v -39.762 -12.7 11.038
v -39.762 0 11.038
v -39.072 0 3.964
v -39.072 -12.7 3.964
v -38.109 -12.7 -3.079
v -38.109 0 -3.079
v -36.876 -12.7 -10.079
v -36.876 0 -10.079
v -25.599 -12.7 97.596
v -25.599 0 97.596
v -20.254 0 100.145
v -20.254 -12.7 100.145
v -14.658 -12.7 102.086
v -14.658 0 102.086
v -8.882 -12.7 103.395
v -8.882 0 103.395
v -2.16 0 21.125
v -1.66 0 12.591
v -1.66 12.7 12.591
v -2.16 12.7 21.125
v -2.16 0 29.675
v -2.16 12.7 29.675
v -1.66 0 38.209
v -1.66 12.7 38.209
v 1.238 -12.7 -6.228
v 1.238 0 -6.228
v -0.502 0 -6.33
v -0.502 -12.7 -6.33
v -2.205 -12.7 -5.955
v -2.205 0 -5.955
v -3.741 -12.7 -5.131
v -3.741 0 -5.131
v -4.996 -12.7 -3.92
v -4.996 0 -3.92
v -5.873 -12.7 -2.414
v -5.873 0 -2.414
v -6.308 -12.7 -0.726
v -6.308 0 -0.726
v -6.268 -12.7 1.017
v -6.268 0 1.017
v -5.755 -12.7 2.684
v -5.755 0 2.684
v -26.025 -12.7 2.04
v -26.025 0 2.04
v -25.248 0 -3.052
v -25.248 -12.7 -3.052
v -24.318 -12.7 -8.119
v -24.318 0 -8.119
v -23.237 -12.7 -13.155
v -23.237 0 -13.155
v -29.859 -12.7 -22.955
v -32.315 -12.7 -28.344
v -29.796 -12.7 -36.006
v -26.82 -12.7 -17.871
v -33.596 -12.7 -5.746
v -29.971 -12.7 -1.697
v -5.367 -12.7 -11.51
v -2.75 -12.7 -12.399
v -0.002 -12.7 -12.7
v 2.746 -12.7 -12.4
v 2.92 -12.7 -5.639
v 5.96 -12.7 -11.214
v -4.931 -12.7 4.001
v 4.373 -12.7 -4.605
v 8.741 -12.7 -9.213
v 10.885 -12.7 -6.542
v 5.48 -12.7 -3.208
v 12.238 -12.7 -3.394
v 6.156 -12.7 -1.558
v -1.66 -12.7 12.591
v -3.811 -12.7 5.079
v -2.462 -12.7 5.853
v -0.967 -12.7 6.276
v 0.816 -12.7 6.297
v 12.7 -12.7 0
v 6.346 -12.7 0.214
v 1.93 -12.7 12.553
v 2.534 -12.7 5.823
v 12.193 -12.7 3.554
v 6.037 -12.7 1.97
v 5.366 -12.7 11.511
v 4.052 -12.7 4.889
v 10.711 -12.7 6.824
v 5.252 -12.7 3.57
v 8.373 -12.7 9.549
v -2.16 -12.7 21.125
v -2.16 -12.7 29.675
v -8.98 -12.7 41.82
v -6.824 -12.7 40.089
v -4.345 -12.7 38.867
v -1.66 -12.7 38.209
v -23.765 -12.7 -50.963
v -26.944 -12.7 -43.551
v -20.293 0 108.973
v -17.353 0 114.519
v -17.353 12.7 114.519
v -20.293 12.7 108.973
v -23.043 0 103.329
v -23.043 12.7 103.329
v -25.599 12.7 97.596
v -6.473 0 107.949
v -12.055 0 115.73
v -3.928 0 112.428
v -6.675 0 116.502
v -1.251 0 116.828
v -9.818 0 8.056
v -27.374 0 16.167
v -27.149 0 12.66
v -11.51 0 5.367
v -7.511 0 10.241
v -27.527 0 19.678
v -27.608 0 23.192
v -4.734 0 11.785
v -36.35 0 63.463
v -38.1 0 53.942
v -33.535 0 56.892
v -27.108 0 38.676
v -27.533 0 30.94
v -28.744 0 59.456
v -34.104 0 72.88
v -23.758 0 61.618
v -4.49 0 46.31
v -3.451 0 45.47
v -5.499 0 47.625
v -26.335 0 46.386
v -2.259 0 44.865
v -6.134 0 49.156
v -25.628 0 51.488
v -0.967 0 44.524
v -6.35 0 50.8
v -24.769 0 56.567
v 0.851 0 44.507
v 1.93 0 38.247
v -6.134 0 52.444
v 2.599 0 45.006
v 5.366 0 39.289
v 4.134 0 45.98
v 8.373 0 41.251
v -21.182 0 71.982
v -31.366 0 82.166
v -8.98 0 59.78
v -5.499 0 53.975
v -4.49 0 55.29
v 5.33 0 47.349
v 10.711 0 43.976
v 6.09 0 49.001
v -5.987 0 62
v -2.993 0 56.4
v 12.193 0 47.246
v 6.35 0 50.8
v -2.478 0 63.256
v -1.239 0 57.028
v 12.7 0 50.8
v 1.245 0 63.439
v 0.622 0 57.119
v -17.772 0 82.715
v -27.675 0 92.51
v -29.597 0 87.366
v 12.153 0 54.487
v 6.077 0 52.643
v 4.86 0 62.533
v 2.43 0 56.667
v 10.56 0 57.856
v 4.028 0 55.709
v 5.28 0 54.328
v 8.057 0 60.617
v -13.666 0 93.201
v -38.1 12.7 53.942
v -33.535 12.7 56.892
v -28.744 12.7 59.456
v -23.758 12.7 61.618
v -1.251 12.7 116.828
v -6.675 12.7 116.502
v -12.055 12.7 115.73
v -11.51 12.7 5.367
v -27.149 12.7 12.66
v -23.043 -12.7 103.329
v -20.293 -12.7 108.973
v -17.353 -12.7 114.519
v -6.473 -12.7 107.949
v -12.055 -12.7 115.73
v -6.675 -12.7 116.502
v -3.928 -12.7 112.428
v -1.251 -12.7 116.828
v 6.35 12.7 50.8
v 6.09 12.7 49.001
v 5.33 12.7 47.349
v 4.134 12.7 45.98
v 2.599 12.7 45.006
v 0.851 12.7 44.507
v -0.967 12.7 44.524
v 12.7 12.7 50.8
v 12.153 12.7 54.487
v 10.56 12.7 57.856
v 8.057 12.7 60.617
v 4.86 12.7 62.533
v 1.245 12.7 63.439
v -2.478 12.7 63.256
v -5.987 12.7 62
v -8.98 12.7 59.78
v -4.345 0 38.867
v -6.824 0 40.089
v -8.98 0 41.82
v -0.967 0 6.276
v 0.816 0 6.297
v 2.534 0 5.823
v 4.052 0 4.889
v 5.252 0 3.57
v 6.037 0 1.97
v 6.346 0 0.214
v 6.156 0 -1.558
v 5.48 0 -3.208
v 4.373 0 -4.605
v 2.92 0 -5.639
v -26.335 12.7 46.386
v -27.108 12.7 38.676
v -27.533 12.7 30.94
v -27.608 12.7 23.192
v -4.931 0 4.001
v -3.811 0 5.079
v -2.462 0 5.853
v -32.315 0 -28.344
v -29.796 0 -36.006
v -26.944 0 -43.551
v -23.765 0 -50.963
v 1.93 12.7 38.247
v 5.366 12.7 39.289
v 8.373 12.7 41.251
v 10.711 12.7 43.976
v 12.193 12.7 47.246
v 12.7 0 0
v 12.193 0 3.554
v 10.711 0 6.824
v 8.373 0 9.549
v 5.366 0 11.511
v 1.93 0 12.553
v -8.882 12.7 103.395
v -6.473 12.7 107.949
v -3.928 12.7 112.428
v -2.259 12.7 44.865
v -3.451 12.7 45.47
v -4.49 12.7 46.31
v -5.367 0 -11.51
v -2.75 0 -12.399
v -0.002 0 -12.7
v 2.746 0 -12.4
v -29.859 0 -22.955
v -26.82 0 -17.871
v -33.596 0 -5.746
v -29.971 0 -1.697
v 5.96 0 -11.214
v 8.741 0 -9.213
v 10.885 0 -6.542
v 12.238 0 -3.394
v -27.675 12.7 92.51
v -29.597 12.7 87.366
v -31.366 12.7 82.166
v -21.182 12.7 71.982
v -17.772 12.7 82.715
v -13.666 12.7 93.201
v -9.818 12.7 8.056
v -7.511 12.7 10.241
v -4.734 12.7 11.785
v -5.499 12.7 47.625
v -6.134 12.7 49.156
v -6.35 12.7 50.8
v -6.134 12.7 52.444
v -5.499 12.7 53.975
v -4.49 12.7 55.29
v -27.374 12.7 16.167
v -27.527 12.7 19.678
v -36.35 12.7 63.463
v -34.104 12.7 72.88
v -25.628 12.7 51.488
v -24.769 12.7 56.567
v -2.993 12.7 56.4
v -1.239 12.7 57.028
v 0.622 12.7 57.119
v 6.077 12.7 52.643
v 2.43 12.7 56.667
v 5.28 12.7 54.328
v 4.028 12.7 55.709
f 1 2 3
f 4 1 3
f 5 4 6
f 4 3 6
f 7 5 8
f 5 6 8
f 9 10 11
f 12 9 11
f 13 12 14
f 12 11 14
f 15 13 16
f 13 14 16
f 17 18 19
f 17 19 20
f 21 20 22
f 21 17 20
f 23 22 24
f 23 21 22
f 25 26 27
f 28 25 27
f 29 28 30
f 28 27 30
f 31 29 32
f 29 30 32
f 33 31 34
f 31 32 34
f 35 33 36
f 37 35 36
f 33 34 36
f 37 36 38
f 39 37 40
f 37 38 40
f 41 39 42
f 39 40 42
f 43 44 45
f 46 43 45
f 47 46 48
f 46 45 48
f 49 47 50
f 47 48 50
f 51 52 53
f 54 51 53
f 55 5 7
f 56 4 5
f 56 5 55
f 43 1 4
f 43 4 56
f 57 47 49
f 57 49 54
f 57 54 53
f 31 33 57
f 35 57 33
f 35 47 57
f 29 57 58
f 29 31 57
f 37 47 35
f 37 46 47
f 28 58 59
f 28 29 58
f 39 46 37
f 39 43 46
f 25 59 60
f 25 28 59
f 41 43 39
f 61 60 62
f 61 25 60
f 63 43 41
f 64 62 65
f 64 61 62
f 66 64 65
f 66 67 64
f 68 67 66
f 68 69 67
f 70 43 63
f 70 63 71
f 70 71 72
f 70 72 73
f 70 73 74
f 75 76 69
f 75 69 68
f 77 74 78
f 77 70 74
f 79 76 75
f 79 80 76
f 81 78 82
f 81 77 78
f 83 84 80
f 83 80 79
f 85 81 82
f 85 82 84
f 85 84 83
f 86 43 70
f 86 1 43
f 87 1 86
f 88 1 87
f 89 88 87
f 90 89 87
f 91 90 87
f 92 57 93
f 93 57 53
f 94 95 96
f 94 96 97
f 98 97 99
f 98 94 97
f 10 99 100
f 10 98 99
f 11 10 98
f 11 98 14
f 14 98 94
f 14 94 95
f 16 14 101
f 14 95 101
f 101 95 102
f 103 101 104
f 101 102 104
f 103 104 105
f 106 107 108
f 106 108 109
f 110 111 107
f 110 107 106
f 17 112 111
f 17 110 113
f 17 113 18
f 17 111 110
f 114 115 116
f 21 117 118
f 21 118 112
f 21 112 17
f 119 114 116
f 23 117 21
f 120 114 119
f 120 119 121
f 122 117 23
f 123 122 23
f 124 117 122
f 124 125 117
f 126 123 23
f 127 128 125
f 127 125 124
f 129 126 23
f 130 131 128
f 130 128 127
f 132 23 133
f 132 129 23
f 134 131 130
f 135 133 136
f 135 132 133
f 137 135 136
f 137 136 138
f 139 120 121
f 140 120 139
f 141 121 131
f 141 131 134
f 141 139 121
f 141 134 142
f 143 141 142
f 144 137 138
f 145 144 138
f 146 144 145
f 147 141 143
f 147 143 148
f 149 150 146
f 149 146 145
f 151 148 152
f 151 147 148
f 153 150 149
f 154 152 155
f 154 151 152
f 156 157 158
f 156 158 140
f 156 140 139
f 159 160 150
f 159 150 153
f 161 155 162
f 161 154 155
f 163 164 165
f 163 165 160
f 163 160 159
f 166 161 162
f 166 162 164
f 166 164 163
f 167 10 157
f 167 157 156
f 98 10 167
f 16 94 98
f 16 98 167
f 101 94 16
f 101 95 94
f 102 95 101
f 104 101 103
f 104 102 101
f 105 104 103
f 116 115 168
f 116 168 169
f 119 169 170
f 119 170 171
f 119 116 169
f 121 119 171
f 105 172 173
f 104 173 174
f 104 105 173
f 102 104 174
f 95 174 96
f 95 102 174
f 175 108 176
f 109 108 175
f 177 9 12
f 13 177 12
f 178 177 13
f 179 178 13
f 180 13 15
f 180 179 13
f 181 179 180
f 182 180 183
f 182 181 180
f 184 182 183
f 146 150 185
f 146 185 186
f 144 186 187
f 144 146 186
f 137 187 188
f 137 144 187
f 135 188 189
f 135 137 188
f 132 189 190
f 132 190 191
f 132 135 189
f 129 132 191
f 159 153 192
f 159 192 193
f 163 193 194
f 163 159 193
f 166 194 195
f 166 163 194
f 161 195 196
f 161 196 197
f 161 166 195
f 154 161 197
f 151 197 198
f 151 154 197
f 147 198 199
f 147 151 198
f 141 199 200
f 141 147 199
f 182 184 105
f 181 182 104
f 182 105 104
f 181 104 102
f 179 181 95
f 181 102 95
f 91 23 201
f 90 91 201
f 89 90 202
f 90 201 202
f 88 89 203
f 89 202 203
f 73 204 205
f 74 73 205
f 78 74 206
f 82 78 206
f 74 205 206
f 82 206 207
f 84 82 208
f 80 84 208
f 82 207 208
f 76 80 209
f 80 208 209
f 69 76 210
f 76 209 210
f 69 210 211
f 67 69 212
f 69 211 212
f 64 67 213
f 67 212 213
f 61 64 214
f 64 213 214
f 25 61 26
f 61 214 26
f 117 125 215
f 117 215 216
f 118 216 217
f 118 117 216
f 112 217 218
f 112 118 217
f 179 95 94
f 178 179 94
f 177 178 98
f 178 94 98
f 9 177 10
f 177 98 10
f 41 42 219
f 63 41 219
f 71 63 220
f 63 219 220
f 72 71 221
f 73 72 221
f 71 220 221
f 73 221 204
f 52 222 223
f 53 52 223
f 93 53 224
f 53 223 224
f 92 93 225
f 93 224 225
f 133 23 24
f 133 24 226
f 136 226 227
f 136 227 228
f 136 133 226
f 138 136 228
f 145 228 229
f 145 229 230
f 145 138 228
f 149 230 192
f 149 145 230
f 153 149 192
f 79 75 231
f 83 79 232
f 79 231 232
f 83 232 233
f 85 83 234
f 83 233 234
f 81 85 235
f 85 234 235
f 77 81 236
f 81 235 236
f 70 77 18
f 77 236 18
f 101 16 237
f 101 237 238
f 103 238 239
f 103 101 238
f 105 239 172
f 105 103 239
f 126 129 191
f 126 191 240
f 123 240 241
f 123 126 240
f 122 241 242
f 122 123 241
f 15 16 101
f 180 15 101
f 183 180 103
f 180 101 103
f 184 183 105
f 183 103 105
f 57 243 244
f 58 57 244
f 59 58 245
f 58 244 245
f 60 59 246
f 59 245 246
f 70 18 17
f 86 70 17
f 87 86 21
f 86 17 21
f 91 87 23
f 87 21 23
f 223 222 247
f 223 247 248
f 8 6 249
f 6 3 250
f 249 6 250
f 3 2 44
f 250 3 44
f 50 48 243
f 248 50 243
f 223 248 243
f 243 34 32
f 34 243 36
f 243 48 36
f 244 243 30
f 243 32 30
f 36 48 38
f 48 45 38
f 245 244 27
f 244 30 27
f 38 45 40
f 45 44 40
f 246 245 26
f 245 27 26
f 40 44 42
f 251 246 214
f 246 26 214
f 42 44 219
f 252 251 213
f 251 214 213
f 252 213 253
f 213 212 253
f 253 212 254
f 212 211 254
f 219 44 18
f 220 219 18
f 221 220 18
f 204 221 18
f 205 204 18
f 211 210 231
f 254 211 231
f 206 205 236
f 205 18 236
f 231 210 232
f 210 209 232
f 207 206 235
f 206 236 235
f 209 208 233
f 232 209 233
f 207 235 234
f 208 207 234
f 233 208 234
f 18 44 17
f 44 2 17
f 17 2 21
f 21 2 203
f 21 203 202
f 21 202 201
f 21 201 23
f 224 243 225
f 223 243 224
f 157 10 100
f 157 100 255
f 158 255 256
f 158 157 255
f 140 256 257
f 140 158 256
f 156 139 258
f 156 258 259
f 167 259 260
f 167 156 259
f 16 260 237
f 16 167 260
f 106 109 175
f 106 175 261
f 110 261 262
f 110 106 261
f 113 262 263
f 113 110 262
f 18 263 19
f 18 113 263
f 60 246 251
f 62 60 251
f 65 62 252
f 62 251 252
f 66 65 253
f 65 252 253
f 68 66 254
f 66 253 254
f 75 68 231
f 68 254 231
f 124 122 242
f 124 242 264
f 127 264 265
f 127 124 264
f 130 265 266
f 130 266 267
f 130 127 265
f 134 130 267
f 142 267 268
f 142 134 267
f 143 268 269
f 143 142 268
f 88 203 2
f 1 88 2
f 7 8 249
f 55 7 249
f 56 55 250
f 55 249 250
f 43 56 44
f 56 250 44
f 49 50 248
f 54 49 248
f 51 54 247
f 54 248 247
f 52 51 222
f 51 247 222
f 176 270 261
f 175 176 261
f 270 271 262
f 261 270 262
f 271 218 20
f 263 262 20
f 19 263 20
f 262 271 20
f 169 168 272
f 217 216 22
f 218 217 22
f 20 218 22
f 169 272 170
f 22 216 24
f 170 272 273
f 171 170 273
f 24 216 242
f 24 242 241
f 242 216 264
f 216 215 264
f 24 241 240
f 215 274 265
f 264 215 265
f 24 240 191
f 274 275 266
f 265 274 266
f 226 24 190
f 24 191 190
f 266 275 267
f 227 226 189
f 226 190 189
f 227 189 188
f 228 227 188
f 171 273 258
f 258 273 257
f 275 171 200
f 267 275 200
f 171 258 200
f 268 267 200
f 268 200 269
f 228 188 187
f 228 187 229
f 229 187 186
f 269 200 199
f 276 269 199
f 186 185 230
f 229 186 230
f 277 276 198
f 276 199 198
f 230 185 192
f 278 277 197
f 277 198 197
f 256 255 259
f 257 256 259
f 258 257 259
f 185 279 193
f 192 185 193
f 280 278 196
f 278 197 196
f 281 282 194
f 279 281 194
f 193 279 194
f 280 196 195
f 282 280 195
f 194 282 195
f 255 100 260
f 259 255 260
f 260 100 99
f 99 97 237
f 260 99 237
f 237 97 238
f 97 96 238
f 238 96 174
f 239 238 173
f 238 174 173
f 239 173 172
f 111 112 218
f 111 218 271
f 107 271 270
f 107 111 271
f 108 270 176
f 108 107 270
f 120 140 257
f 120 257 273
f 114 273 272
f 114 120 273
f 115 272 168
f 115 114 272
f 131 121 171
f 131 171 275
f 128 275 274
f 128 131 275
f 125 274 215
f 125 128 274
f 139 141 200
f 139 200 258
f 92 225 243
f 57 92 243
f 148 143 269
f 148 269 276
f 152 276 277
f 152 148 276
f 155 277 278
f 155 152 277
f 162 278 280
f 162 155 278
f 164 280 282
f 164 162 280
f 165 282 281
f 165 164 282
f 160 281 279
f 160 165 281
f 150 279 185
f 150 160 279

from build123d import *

# Parameters (mm, degrees)
F1_DEPTH = 12.7
F2_DEPTH = 12.7


with BuildPart() as f1:
    # F0 (on Front) → F1 (new body)
    with BuildSketch(Plane.XZ):
        with BuildLine():
            ThreePointArc((-25.5994319004, 97.5955626783), (-17.4827308479, 101.1935484174), (-8.8816627401, 103.3953578462))
            ThreePointArc((-8.8816627401, 103.3953578462), (-5.2173217074, 110.1976419206), (-1.2506190365, 116.8281572666))
            ThreePointArc((-1.2506190365, 116.8281572666), (-9.3730802173, 116.1714537642), (-17.3528252422, 114.5193930928))
            ThreePointArc((-17.3528252422, 114.5193930928), (-21.6922788774, 106.1628031287), (-25.5994319004, 97.5955626783))
        make_face()
    extrude(amount=F1_DEPTH)


with BuildPart() as f1b:
    # F0 (on Front) → F1, piece 2 (new body)
    with BuildSketch(Plane.XZ):
        with BuildLine():
            Line((-23.76464523, -50.9634461592), (-16.5005489408, -35.3855413958))
            ThreePointArc((-16.5005489408, -35.3855413958), (-20.2450862438, -24.3843475762), (-23.2367694573, -13.1550262867))
            ThreePointArc((-23.2367694573, -13.1550262867), (-28.4102740665, -20.3703701742), (-32.3152871513, -28.3439020242))
            ThreePointArc((-32.3152871513, -28.3439020242), (-28.4112043135, -39.7940095573), (-23.76464523, -50.9634461592))
        make_face()
        with BuildLine():
            ThreePointArc((-5.3672519241, -11.5101088954), (-11.934096284, -4.3436558202), (-11.5101088954, 5.3672519241))
            Line((-11.5101088954, 5.3672519241), (-27.1488132668, 12.6596995361))
            ThreePointArc((-27.1488132668, 12.6596995361), (-26.6697420202, 7.341230959), (-26.0254878639, 2.0402354064))
            ThreePointArc((-26.0254878639, 2.0402354064), (-24.8021452922, -5.5887813575), (-23.2367694573, -13.1550262867))
            ThreePointArc((-23.2367694573, -13.1550262867), (-20.2450862438, -24.3843475762), (-16.5005489408, -35.3855413958))
            Line((-16.5005489408, -35.3855413958), (-5.3672519241, -11.5101088954))
        make_face()
        with BuildLine():
            ThreePointArc((-26.0254878639, 2.0402354064), (-26.6697420202, 7.341230959), (-27.1488132668, 12.6596995361))
            Line((-27.1488132668, 12.6596995361), (-34.6448439504, 16.1551560496))
            Line((-34.6448439504, 16.1551560496), (-39.761986918, 11.038013082))
            ThreePointArc((-39.761986918, 11.038013082), (-38.6246011082, 0.4379371292), (-36.876448445, -10.078679197))
            ThreePointArc((-36.876448445, -10.078679197), (-31.8255332412, -3.6838460696), (-26.0254878639, 2.0402354064))
        make_face()
        with BuildLine():
            ThreePointArc((-11.5101088954, 5.3672519241), (-7.5106952878, 10.2410671462), (-1.6602958084, 12.5910054336))
            ThreePointArc((-1.6602958084, 12.5910054336), (-2.2222120536, 25.4), (-1.6602958084, 38.2089945664))
            ThreePointArc((-1.6602958084, 38.2089945664), (-5.6182483027, 39.4102991256), (-8.9802561211, 41.8197438789))
            Line((-8.9802561211, 41.8197438789), (-27.6080120185, 23.1919879815))
            ThreePointArc((-27.6080120185, 23.1919879815), (-27.459279183, 17.922318047), (-27.1488132668, 12.6596995361))
            Line((-27.1488132668, 12.6596995361), (-11.5101088954, 5.3672519241))
        make_face()
        with BuildLine():
            Line((-34.6448439504, 16.1551560496), (-27.1488132668, 12.6596995361))
            ThreePointArc((-27.1488132668, 12.6596995361), (-27.459279183, 17.922318047), (-27.6080120185, 23.1919879815))
            Line((-27.6080120185, 23.1919879815), (-34.6448439504, 16.1551560496))
        make_face()
        with BuildLine():
            Line((-5.7550544477, 2.6836259621), (-11.5101088954, 5.3672519241))
            ThreePointArc((-11.5101088954, 5.3672519241), (-11.934096284, -4.3436558202), (-5.3672519241, -11.5101088954))
            Line((-5.3672519241, -11.5101088954), (-2.6836259621, -5.7550544477))
            ThreePointArc((-2.6836259621, -5.7550544477), (-5.967048142, -2.1718279101), (-5.7550544477, 2.6836259621))
        make_face()
        with BuildLine():
            ThreePointArc((-0.9666668919, 6.2759903697), (-1.3477700165, 9.4297317015), (-1.6602958084, 12.5910054336))
            ThreePointArc((-1.6602958084, 12.5910054336), (-7.5106952878, 10.2410671462), (-11.5101088954, 5.3672519241))
            Line((-11.5101088954, 5.3672519241), (-5.7550544477, 2.6836259621))
            ThreePointArc((-5.7550544477, 2.6836259621), (-3.8107289265, 5.0794532234), (-0.9666668919, 6.2759903697))
        make_face()
        with BuildLine():
            ThreePointArc((2.7462097635, -12.3995295046), (9.9037079924, -7.9502558451), (12.7, 0))
            ThreePointArc((12.7, 0), (8.372700975, 9.5492344397), (-1.6602958084, 12.5910054336))
            ThreePointArc((-1.6602958084, 12.5910054336), (-1.3477700165, 9.4297317015), (-0.9666668919, 6.2759903697))
            ThreePointArc((-0.9666668919, 6.2759903697), (4.1342572027, 4.8197943298), (6.35, 0))
            ThreePointArc((6.35, 0), (4.9083970483, -4.0286645947), (1.2381453807, -6.2281213874))
            ThreePointArc((1.2381453807, -6.2281213874), (1.958668649, -9.3220137901), (2.7462097635, -12.3995295046))
        make_face()
        with BuildLine():
            ThreePointArc((-5.3672519241, -11.5101088954), (-1.3839193463, -12.6243719544), (2.7462097635, -12.3995295046))
            ThreePointArc((2.7462097635, -12.3995295046), (1.958668649, -9.3220137901), (1.2381453807, -6.2281213874))
            ThreePointArc((1.2381453807, -6.2281213874), (-0.7604614455, -6.3042999921), (-2.6836259621, -5.7550544477))
            Line((-2.6836259621, -5.7550544477), (-5.3672519241, -11.5101088954))
        make_face()
    extrude(amount=F1_DEPTH)


with BuildPart() as f2:
    # F0 (on Front) → F2 (new body)
    with BuildSketch(Plane.XZ):
        with BuildLine():
            Line((-27.6080120185, 23.1919879815), (-8.9802561211, 41.8197438789))
            ThreePointArc((-8.9802561211, 41.8197438789), (-12.7, 50.8), (-8.9802561211, 59.7802561211))
            Line((-8.9802561211, 59.7802561211), (-21.1816672401, 71.9816672401))
            ThreePointArc((-21.1816672401, 71.9816672401), (-22.5505109099, 66.8200895478), (-23.7581572919, 61.6184352454))
            ThreePointArc((-23.7581572919, 61.6184352454), (-25.2178687116, 54.0310966868), (-26.334704766, 46.3857620924))
            ThreePointArc((-26.334704766, 46.3857620924), (-27.3640962034, 34.8104358188), (-27.6080120185, 23.1919879815))
        make_face()
        with BuildLine():
            ThreePointArc((-11.5101088954, 5.3672519241), (-7.5106952878, 10.2410671462), (-1.6602958084, 12.5910054336))
            ThreePointArc((-1.6602958084, 12.5910054336), (-2.2222120536, 25.4), (-1.6602958084, 38.2089945664))
            ThreePointArc((-1.6602958084, 38.2089945664), (-5.6182483027, 39.4102991256), (-8.9802561211, 41.8197438789))
            Line((-8.9802561211, 41.8197438789), (-27.6080120185, 23.1919879815))
            ThreePointArc((-27.6080120185, 23.1919879815), (-27.459279183, 17.922318047), (-27.1488132668, 12.6596995361))
            Line((-27.1488132668, 12.6596995361), (-11.5101088954, 5.3672519241))
        make_face()
        with BuildLine():
            ThreePointArc((-23.7581572919, 61.6184352454), (-22.5505109099, 66.8200895478), (-21.1816672401, 71.9816672401))
            Line((-21.1816672401, 71.9816672401), (-31.3659370421, 82.1659370421))
            ThreePointArc((-31.3659370421, 82.1659370421), (-35.2888897153, 68.1864561816), (-38.0996377881, 53.9416277138))
            ThreePointArc((-38.0996377881, 53.9416277138), (-31.1661683001, 58.2232904729), (-23.7581572919, 61.6184352454))
        make_face()
        with BuildLine():
            Line((-31.3659370421, 82.1659370421), (-21.1816672401, 71.9816672401))
            ThreePointArc((-21.1816672401, 71.9816672401), (-15.8051852828, 87.9913837722), (-8.8816627401, 103.3953578462))
            ThreePointArc((-8.8816627401, 103.3953578462), (-17.4827308479, 101.1935484174), (-25.5994319004, 97.5955626783))
            ThreePointArc((-25.5994319004, 97.5955626783), (-28.6550820191, 89.9451798969), (-31.3659370421, 82.1659370421))
        make_face()
        with BuildLine():
            ThreePointArc((-25.5994319004, 97.5955626783), (-17.4827308479, 101.1935484174), (-8.8816627401, 103.3953578462))
            ThreePointArc((-8.8816627401, 103.3953578462), (-5.2173217074, 110.1976419206), (-1.2506190365, 116.8281572666))
            ThreePointArc((-1.2506190365, 116.8281572666), (-9.3730802173, 116.1714537642), (-17.3528252422, 114.5193930928))
            ThreePointArc((-17.3528252422, 114.5193930928), (-21.6922788774, 106.1628031287), (-25.5994319004, 97.5955626783))
        make_face()
        with BuildLine():
            ThreePointArc((-8.9802561211, 41.8197438789), (-5.6182483027, 39.4102991256), (-1.6602958084, 38.2089945664))
            ThreePointArc((-1.6602958084, 38.2089945664), (-1.3477700165, 41.3702682985), (-0.9666668919, 44.5240096303))
            ThreePointArc((-0.9666668919, 44.5240096303), (-2.8707975956, 45.1359889508), (-4.4901280605, 46.3098719395))
            Line((-4.4901280605, 46.3098719395), (-8.9802561211, 41.8197438789))
        make_face()
        with BuildLine():
            ThreePointArc((-8.9802561211, 59.7802561211), (-12.7, 50.8), (-8.9802561211, 41.8197438789))
            Line((-8.9802561211, 41.8197438789), (-4.4901280605, 46.3098719395))
            ThreePointArc((-4.4901280605, 46.3098719395), (-6.35, 50.8), (-4.4901280605, 55.2901280605))
            Line((-4.4901280605, 55.2901280605), (-8.9802561211, 59.7802561211))
        make_face()
        with BuildLine():
            ThreePointArc((-0.9666668919, 44.5240096303), (-1.3477700165, 41.3702682985), (-1.6602958084, 38.2089945664))
            ThreePointArc((-1.6602958084, 38.2089945664), (8.372700975, 41.2507655603), (12.7, 50.8))
            ThreePointArc((12.7, 50.8), (4.860079591, 62.5332700629), (-8.9802561211, 59.7802561211))
            Line((-8.9802561211, 59.7802561211), (-4.4901280605, 55.2901280605))
            ThreePointArc((-4.4901280605, 55.2901280605), (2.4300397955, 56.6666350314), (6.35, 50.8))
            ThreePointArc((6.35, 50.8), (4.1342572027, 45.9802056702), (-0.9666668919, 44.5240096303))
        make_face()
    extrude(amount=-F2_DEPTH)


solid = Compound([f1.part, f1b.part, f2.part])
